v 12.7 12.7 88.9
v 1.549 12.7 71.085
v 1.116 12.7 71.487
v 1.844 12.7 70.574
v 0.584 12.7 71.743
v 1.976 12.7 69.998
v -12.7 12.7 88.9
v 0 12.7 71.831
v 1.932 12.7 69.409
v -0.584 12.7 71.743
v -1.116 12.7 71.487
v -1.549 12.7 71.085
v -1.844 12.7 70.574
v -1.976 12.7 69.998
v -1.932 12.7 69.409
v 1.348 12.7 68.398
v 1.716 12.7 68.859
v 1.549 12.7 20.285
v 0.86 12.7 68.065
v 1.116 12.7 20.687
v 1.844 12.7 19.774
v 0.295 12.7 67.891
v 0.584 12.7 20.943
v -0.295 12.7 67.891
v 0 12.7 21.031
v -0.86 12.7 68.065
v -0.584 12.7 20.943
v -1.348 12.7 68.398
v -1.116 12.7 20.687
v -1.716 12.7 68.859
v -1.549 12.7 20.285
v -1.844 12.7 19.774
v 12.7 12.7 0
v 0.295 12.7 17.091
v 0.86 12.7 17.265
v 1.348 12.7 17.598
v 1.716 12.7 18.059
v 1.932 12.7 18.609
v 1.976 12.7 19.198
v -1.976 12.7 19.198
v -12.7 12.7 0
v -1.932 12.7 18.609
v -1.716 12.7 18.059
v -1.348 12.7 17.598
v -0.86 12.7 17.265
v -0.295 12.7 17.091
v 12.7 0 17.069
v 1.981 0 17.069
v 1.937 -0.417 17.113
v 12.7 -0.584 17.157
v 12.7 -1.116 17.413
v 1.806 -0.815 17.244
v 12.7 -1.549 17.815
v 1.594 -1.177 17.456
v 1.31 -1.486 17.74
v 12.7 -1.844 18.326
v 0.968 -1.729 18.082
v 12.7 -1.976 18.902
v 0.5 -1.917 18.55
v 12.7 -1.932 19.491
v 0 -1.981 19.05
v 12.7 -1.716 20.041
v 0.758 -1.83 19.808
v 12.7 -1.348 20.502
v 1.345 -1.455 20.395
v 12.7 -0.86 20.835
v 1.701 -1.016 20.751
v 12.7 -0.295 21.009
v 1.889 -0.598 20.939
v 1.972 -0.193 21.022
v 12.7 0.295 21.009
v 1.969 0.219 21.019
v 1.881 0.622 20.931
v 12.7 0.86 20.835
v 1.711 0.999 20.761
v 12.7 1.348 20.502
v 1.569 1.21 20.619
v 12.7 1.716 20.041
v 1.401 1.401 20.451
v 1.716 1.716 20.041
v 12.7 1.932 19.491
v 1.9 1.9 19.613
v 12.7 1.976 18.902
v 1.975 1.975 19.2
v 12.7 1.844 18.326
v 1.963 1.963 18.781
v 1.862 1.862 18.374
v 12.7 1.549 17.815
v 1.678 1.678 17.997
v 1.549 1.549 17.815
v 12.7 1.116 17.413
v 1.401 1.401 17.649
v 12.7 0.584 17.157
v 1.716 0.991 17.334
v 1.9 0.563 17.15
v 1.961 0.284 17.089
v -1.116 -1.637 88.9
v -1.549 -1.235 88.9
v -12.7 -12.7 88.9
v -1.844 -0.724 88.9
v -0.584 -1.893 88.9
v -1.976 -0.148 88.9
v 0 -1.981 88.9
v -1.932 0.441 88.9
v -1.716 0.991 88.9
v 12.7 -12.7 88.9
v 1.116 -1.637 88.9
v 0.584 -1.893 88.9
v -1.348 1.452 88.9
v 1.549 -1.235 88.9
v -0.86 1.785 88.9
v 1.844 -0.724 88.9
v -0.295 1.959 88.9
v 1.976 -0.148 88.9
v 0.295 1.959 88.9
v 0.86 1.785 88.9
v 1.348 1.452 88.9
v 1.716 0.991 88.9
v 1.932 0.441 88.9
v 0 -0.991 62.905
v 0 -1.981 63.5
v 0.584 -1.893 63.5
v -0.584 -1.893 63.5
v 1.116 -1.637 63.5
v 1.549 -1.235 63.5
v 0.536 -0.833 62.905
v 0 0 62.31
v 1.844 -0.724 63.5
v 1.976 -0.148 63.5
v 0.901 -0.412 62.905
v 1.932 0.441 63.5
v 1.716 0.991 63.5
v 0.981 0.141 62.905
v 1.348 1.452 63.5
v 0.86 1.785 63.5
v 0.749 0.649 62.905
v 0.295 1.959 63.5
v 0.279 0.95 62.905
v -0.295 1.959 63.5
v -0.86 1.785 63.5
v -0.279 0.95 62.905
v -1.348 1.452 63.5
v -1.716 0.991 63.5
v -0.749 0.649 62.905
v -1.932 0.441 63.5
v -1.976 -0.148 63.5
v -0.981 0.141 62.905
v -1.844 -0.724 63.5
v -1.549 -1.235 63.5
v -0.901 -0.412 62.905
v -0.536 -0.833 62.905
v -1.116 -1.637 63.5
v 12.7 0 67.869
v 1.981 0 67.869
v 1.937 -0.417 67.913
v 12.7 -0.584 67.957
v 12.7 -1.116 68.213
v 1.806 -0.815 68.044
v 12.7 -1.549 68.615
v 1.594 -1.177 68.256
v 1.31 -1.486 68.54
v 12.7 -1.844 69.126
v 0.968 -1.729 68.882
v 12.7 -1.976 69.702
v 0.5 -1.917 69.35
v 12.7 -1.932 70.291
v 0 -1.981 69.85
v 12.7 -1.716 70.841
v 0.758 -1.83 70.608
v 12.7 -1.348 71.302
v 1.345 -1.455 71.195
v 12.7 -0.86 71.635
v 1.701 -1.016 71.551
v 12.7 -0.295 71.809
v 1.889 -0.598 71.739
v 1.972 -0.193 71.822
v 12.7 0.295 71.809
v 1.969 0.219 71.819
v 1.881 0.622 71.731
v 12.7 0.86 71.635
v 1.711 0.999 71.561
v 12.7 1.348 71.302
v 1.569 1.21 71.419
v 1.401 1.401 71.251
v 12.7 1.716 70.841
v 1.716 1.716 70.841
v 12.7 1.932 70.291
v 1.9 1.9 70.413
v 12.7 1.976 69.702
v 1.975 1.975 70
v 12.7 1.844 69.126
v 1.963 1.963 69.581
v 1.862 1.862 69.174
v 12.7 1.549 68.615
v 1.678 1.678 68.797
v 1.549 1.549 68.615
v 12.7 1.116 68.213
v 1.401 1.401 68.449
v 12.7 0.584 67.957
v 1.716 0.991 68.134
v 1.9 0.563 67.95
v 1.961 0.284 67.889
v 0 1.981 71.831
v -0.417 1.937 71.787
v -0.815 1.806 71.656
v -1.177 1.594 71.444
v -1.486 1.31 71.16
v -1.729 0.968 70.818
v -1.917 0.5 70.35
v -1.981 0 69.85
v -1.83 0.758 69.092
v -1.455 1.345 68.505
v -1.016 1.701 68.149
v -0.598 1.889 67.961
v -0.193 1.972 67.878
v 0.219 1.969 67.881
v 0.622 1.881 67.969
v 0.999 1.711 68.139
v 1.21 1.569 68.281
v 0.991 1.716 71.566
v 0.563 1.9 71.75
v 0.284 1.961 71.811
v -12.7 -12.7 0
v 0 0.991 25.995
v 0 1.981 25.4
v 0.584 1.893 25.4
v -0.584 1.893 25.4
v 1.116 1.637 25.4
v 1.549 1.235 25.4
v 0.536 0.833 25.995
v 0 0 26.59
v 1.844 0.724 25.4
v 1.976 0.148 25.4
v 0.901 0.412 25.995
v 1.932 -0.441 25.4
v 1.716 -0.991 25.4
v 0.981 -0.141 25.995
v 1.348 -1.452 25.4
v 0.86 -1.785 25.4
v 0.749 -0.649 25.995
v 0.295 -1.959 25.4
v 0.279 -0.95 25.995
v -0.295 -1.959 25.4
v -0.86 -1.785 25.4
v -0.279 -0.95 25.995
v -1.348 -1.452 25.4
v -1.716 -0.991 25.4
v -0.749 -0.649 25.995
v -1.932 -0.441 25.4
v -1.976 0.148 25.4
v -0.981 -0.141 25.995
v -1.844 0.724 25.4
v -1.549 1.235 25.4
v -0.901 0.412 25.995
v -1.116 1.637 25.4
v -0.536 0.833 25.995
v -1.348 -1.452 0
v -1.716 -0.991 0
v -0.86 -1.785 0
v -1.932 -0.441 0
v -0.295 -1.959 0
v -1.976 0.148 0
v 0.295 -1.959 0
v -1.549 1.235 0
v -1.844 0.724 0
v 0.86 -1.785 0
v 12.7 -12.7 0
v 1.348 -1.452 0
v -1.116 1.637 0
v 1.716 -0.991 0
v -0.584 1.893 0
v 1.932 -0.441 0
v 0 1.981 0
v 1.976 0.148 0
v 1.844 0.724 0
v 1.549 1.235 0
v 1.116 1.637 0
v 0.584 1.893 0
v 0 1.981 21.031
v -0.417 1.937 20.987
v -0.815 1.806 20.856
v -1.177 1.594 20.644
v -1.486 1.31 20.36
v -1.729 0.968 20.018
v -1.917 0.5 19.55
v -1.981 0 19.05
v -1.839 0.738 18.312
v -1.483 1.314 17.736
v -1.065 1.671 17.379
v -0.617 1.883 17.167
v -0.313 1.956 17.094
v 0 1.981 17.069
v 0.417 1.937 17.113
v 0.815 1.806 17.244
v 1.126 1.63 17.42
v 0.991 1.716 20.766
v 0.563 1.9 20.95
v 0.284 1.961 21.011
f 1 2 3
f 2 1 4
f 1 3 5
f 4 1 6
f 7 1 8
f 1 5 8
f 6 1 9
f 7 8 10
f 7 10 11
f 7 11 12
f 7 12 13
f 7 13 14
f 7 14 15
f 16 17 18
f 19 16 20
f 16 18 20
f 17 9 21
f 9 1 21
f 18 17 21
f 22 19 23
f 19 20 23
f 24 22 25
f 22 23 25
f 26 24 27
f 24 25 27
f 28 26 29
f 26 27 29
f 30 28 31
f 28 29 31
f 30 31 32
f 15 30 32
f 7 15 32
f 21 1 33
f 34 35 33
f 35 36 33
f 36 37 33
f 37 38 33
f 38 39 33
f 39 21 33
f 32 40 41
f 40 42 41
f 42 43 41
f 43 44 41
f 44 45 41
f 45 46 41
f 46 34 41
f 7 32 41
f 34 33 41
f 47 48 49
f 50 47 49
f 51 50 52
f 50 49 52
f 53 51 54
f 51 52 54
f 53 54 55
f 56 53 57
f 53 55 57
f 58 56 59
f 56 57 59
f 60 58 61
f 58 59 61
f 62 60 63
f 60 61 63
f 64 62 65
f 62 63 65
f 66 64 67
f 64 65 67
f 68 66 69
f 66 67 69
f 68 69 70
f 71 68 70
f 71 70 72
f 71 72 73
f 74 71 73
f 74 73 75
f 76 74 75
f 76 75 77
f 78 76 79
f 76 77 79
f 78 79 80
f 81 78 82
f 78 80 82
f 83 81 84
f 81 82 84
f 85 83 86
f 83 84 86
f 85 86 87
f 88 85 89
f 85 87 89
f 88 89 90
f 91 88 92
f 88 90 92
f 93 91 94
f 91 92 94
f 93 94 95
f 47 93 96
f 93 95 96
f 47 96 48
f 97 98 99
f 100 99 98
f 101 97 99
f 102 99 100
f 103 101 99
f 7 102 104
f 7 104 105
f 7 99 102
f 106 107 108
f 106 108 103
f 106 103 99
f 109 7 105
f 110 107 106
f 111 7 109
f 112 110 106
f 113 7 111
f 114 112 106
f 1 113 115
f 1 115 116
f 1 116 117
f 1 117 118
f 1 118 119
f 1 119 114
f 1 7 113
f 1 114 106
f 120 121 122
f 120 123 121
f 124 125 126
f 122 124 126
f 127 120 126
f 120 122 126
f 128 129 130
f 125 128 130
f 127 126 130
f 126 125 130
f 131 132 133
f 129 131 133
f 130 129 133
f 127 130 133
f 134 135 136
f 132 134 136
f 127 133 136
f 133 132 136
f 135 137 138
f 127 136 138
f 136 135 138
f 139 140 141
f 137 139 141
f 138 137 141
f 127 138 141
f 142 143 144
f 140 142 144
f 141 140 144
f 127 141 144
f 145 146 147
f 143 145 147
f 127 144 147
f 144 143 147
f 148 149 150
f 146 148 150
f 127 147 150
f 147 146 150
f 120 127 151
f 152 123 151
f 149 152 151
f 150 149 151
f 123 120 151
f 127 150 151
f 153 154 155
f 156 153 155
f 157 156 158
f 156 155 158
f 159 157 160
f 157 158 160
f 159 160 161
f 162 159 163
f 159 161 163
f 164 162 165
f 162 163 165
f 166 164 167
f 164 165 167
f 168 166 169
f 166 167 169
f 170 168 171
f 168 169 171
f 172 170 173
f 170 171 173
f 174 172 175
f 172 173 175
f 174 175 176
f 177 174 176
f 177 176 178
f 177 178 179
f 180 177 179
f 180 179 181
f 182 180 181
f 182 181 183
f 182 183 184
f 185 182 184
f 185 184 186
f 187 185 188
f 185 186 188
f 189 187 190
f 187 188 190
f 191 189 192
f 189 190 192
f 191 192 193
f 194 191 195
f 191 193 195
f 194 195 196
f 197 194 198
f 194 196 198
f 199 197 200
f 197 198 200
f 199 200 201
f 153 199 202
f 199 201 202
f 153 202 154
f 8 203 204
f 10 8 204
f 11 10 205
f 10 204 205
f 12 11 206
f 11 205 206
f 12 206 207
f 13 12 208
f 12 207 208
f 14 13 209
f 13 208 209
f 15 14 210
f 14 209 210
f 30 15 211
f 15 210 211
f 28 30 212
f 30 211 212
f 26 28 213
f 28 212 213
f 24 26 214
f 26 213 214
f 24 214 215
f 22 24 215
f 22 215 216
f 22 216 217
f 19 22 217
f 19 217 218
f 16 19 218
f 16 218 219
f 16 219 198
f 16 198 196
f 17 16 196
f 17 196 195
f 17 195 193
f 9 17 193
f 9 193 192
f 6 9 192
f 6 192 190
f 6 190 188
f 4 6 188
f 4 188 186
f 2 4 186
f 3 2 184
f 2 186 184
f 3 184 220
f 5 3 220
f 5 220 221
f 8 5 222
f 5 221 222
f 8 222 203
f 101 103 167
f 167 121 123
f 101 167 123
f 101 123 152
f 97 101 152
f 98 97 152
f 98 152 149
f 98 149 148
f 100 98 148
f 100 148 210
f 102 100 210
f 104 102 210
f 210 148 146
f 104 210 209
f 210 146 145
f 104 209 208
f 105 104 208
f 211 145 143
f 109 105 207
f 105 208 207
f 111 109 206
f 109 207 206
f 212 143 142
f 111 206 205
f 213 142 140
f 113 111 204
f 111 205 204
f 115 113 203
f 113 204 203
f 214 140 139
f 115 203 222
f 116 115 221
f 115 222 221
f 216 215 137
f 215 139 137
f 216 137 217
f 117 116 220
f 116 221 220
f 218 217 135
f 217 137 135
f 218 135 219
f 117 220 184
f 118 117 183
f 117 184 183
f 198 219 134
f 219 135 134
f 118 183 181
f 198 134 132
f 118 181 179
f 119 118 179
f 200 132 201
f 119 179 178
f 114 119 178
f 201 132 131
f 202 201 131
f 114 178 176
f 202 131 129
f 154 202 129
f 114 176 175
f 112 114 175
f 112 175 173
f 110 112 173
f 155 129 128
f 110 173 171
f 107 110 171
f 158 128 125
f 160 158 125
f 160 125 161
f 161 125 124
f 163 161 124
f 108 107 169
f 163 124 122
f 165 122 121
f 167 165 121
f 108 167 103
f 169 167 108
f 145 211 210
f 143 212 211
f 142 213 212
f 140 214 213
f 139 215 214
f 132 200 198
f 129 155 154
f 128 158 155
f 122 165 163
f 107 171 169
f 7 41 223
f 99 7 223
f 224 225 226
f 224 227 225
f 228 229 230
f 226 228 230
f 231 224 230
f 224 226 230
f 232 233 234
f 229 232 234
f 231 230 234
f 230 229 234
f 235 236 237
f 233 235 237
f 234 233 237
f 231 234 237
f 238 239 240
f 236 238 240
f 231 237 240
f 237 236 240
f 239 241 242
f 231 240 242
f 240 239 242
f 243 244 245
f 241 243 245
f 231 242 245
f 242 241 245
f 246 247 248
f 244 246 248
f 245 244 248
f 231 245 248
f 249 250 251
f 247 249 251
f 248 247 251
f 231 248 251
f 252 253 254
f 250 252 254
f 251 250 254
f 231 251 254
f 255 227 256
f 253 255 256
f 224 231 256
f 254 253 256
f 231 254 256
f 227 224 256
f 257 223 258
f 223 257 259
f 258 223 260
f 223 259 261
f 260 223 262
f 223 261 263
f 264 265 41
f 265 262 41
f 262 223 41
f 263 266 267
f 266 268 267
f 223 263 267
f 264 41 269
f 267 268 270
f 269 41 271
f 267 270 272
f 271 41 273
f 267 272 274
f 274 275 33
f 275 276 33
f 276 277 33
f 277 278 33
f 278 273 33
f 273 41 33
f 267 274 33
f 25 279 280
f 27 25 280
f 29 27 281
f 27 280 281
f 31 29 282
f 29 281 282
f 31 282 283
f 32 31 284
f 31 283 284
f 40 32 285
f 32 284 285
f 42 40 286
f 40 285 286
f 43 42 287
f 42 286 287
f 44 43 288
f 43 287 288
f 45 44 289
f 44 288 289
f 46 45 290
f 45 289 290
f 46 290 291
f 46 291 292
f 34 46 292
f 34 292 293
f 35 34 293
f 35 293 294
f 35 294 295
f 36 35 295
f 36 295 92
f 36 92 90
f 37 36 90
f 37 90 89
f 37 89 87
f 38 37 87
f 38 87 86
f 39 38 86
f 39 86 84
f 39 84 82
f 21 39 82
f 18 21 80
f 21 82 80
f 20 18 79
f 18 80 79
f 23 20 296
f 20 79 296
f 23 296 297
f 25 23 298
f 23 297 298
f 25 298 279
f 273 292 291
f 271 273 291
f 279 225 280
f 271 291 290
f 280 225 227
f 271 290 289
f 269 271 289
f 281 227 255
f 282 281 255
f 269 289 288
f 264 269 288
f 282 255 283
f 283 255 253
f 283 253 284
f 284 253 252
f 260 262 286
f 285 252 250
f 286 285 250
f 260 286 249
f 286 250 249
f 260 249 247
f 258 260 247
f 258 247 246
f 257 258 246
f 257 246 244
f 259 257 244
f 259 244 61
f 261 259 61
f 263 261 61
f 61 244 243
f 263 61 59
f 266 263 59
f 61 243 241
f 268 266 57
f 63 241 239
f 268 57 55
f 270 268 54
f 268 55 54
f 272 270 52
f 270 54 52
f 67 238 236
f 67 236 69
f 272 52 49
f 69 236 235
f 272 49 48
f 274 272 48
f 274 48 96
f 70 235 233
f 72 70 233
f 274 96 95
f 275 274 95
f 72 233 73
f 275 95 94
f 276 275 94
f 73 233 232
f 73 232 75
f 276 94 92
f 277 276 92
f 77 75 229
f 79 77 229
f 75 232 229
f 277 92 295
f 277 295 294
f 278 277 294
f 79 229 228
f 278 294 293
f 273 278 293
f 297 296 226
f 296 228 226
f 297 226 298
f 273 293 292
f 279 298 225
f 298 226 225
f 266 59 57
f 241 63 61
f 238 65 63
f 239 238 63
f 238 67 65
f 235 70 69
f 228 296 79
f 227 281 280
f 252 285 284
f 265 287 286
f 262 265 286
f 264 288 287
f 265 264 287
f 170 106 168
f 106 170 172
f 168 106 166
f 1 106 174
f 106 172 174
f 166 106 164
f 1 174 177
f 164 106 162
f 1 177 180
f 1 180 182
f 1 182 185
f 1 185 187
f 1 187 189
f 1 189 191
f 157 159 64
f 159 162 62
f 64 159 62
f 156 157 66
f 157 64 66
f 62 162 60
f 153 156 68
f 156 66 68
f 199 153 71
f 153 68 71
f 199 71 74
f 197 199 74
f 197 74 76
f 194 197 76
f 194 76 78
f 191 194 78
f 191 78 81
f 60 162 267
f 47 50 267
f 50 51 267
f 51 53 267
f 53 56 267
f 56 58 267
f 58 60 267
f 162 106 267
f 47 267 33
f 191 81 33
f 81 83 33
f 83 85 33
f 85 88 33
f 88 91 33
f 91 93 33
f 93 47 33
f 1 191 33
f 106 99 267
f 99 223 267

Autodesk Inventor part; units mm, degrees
ref_plane "YZ Plane" through (0, 0, 0) normal (1, 0, 0) x (0, 1, 0)
ref_plane "XZ Plane" through (0, 0, 0) normal (0, 1, 0) x (-1, 0, 0)
ref_plane "XY Plane" through (0, 0, 0) normal (0, 0, 1) x (1, 0, 0)
sketch "Sketch1" plane through (0, 0, 0) normal (0, 0, 1) x (1, 0, 0)
  line L0 (-12.7, -12.7) -> (12.7, -12.7)
  line L1 (12.7, -12.7) -> (12.7, 12.7)
  line L2 (12.7, 12.7) -> (-12.7, 12.7)
  line L3 (-12.7, 12.7) -> (-12.7, -12.7)
  line L4 (-12.7, -12.7) -> (12.7, 12.7) construction
  line L5 (12.7, -12.7) -> (-12.7, 12.7) construction
  point P0 (0, 0)
  dimension "d0" = 25.4
  dimension "d1" = 25.4
extrude "Extrusion1" add sketch "Sketch1" along normal blind 88.9
sketch "Sketch2" plane through (12.7, -12.7, 0) normal (1, 0, 0) x (0, 0, -1)
  line L0 (-88.9, 0) -> (-88.9, 25.4) projected
  line L1 (0, 0) -> (0, 25.4) projected
  line L2 (0, 0) -> (-88.9, 0) projected
  point P0 (0, 12.7)
  point P1 (-69.85, 12.7)
  point P2 (-19.05, 12.7)
  dimension "d4" = 19.05
  dimension "d5" = 88.9
  dimension "d7" = 19.05
  dimension "d27" = 25.4
  dimension "d28" = 12.7
hole "Hole1" at (12.7, 0, 69.85) at (12.7, 0, 19.05) direction (-1, 0, 0) diameter 3.9624 depth 12.7 tip angle 118 thread size "10-32 UNF" class "2B" standard "ANSI Unified Screw Threads"
sketch "Sketch3" plane through (-12.7, 12.7, 0) normal (0, 1, 0) x (1, 0, 0)
  line L0 (12.7, -21.0312) -> (12.7, -17.0688) projected
  line L1 (12.7, -71.8312) -> (12.7, -67.8688) projected
  line L2 (25.4, -88.9) -> (0, -88.9) projected
  line L3 (25.4, 0) -> (0, 0) projected
  line L4 (0, 0) -> (0, -88.9) projected
  point P0 (12.7, 0)
  point P1 (12.7, -19.05)
  point P2 (12.7, -69.85)
hole "Hole2" at (0, 12.7, 19.05) at (0, 12.7, 69.85) direction (0, -1, 0) diameter 3.9624 depth 12.7 tip angle 118 thread size "10-32 UNF" class "2B" standard "ANSI Unified Screw Threads"
sketch "Sketch4" plane through (0, 0, 88.9) normal (0, 0, 1) x (1, 0, 0)
  point P0 (0, 0)
  point P1 (0, 0)
hole "Hole3" at (0, 0, 88.9) direction (0, 0, -1) diameter 3.9624 depth 25.4 tip angle 118 thread size "10-32 UNF" class "2B" standard "ANSI Unified Screw Threads"
sketch "Sketch5" plane through (0, 0, 0) normal (0, 0, -1) x (-1, 0, 0)
  point P0 (0, 0)
  point P1 (0, 0)
hole "Hole4" at (0, 0, 0) direction (0, 0, 1) diameter 3.9624 depth 25.4 tip angle 118 thread size "10-32 UNF" class "2B" standard "ANSI Unified Screw Threads"
equation "\"d7\" = d4"
equation "\"d28\" = 0.5 * d27"
properties part number "CH3-DiffBoxGussetBlock"
